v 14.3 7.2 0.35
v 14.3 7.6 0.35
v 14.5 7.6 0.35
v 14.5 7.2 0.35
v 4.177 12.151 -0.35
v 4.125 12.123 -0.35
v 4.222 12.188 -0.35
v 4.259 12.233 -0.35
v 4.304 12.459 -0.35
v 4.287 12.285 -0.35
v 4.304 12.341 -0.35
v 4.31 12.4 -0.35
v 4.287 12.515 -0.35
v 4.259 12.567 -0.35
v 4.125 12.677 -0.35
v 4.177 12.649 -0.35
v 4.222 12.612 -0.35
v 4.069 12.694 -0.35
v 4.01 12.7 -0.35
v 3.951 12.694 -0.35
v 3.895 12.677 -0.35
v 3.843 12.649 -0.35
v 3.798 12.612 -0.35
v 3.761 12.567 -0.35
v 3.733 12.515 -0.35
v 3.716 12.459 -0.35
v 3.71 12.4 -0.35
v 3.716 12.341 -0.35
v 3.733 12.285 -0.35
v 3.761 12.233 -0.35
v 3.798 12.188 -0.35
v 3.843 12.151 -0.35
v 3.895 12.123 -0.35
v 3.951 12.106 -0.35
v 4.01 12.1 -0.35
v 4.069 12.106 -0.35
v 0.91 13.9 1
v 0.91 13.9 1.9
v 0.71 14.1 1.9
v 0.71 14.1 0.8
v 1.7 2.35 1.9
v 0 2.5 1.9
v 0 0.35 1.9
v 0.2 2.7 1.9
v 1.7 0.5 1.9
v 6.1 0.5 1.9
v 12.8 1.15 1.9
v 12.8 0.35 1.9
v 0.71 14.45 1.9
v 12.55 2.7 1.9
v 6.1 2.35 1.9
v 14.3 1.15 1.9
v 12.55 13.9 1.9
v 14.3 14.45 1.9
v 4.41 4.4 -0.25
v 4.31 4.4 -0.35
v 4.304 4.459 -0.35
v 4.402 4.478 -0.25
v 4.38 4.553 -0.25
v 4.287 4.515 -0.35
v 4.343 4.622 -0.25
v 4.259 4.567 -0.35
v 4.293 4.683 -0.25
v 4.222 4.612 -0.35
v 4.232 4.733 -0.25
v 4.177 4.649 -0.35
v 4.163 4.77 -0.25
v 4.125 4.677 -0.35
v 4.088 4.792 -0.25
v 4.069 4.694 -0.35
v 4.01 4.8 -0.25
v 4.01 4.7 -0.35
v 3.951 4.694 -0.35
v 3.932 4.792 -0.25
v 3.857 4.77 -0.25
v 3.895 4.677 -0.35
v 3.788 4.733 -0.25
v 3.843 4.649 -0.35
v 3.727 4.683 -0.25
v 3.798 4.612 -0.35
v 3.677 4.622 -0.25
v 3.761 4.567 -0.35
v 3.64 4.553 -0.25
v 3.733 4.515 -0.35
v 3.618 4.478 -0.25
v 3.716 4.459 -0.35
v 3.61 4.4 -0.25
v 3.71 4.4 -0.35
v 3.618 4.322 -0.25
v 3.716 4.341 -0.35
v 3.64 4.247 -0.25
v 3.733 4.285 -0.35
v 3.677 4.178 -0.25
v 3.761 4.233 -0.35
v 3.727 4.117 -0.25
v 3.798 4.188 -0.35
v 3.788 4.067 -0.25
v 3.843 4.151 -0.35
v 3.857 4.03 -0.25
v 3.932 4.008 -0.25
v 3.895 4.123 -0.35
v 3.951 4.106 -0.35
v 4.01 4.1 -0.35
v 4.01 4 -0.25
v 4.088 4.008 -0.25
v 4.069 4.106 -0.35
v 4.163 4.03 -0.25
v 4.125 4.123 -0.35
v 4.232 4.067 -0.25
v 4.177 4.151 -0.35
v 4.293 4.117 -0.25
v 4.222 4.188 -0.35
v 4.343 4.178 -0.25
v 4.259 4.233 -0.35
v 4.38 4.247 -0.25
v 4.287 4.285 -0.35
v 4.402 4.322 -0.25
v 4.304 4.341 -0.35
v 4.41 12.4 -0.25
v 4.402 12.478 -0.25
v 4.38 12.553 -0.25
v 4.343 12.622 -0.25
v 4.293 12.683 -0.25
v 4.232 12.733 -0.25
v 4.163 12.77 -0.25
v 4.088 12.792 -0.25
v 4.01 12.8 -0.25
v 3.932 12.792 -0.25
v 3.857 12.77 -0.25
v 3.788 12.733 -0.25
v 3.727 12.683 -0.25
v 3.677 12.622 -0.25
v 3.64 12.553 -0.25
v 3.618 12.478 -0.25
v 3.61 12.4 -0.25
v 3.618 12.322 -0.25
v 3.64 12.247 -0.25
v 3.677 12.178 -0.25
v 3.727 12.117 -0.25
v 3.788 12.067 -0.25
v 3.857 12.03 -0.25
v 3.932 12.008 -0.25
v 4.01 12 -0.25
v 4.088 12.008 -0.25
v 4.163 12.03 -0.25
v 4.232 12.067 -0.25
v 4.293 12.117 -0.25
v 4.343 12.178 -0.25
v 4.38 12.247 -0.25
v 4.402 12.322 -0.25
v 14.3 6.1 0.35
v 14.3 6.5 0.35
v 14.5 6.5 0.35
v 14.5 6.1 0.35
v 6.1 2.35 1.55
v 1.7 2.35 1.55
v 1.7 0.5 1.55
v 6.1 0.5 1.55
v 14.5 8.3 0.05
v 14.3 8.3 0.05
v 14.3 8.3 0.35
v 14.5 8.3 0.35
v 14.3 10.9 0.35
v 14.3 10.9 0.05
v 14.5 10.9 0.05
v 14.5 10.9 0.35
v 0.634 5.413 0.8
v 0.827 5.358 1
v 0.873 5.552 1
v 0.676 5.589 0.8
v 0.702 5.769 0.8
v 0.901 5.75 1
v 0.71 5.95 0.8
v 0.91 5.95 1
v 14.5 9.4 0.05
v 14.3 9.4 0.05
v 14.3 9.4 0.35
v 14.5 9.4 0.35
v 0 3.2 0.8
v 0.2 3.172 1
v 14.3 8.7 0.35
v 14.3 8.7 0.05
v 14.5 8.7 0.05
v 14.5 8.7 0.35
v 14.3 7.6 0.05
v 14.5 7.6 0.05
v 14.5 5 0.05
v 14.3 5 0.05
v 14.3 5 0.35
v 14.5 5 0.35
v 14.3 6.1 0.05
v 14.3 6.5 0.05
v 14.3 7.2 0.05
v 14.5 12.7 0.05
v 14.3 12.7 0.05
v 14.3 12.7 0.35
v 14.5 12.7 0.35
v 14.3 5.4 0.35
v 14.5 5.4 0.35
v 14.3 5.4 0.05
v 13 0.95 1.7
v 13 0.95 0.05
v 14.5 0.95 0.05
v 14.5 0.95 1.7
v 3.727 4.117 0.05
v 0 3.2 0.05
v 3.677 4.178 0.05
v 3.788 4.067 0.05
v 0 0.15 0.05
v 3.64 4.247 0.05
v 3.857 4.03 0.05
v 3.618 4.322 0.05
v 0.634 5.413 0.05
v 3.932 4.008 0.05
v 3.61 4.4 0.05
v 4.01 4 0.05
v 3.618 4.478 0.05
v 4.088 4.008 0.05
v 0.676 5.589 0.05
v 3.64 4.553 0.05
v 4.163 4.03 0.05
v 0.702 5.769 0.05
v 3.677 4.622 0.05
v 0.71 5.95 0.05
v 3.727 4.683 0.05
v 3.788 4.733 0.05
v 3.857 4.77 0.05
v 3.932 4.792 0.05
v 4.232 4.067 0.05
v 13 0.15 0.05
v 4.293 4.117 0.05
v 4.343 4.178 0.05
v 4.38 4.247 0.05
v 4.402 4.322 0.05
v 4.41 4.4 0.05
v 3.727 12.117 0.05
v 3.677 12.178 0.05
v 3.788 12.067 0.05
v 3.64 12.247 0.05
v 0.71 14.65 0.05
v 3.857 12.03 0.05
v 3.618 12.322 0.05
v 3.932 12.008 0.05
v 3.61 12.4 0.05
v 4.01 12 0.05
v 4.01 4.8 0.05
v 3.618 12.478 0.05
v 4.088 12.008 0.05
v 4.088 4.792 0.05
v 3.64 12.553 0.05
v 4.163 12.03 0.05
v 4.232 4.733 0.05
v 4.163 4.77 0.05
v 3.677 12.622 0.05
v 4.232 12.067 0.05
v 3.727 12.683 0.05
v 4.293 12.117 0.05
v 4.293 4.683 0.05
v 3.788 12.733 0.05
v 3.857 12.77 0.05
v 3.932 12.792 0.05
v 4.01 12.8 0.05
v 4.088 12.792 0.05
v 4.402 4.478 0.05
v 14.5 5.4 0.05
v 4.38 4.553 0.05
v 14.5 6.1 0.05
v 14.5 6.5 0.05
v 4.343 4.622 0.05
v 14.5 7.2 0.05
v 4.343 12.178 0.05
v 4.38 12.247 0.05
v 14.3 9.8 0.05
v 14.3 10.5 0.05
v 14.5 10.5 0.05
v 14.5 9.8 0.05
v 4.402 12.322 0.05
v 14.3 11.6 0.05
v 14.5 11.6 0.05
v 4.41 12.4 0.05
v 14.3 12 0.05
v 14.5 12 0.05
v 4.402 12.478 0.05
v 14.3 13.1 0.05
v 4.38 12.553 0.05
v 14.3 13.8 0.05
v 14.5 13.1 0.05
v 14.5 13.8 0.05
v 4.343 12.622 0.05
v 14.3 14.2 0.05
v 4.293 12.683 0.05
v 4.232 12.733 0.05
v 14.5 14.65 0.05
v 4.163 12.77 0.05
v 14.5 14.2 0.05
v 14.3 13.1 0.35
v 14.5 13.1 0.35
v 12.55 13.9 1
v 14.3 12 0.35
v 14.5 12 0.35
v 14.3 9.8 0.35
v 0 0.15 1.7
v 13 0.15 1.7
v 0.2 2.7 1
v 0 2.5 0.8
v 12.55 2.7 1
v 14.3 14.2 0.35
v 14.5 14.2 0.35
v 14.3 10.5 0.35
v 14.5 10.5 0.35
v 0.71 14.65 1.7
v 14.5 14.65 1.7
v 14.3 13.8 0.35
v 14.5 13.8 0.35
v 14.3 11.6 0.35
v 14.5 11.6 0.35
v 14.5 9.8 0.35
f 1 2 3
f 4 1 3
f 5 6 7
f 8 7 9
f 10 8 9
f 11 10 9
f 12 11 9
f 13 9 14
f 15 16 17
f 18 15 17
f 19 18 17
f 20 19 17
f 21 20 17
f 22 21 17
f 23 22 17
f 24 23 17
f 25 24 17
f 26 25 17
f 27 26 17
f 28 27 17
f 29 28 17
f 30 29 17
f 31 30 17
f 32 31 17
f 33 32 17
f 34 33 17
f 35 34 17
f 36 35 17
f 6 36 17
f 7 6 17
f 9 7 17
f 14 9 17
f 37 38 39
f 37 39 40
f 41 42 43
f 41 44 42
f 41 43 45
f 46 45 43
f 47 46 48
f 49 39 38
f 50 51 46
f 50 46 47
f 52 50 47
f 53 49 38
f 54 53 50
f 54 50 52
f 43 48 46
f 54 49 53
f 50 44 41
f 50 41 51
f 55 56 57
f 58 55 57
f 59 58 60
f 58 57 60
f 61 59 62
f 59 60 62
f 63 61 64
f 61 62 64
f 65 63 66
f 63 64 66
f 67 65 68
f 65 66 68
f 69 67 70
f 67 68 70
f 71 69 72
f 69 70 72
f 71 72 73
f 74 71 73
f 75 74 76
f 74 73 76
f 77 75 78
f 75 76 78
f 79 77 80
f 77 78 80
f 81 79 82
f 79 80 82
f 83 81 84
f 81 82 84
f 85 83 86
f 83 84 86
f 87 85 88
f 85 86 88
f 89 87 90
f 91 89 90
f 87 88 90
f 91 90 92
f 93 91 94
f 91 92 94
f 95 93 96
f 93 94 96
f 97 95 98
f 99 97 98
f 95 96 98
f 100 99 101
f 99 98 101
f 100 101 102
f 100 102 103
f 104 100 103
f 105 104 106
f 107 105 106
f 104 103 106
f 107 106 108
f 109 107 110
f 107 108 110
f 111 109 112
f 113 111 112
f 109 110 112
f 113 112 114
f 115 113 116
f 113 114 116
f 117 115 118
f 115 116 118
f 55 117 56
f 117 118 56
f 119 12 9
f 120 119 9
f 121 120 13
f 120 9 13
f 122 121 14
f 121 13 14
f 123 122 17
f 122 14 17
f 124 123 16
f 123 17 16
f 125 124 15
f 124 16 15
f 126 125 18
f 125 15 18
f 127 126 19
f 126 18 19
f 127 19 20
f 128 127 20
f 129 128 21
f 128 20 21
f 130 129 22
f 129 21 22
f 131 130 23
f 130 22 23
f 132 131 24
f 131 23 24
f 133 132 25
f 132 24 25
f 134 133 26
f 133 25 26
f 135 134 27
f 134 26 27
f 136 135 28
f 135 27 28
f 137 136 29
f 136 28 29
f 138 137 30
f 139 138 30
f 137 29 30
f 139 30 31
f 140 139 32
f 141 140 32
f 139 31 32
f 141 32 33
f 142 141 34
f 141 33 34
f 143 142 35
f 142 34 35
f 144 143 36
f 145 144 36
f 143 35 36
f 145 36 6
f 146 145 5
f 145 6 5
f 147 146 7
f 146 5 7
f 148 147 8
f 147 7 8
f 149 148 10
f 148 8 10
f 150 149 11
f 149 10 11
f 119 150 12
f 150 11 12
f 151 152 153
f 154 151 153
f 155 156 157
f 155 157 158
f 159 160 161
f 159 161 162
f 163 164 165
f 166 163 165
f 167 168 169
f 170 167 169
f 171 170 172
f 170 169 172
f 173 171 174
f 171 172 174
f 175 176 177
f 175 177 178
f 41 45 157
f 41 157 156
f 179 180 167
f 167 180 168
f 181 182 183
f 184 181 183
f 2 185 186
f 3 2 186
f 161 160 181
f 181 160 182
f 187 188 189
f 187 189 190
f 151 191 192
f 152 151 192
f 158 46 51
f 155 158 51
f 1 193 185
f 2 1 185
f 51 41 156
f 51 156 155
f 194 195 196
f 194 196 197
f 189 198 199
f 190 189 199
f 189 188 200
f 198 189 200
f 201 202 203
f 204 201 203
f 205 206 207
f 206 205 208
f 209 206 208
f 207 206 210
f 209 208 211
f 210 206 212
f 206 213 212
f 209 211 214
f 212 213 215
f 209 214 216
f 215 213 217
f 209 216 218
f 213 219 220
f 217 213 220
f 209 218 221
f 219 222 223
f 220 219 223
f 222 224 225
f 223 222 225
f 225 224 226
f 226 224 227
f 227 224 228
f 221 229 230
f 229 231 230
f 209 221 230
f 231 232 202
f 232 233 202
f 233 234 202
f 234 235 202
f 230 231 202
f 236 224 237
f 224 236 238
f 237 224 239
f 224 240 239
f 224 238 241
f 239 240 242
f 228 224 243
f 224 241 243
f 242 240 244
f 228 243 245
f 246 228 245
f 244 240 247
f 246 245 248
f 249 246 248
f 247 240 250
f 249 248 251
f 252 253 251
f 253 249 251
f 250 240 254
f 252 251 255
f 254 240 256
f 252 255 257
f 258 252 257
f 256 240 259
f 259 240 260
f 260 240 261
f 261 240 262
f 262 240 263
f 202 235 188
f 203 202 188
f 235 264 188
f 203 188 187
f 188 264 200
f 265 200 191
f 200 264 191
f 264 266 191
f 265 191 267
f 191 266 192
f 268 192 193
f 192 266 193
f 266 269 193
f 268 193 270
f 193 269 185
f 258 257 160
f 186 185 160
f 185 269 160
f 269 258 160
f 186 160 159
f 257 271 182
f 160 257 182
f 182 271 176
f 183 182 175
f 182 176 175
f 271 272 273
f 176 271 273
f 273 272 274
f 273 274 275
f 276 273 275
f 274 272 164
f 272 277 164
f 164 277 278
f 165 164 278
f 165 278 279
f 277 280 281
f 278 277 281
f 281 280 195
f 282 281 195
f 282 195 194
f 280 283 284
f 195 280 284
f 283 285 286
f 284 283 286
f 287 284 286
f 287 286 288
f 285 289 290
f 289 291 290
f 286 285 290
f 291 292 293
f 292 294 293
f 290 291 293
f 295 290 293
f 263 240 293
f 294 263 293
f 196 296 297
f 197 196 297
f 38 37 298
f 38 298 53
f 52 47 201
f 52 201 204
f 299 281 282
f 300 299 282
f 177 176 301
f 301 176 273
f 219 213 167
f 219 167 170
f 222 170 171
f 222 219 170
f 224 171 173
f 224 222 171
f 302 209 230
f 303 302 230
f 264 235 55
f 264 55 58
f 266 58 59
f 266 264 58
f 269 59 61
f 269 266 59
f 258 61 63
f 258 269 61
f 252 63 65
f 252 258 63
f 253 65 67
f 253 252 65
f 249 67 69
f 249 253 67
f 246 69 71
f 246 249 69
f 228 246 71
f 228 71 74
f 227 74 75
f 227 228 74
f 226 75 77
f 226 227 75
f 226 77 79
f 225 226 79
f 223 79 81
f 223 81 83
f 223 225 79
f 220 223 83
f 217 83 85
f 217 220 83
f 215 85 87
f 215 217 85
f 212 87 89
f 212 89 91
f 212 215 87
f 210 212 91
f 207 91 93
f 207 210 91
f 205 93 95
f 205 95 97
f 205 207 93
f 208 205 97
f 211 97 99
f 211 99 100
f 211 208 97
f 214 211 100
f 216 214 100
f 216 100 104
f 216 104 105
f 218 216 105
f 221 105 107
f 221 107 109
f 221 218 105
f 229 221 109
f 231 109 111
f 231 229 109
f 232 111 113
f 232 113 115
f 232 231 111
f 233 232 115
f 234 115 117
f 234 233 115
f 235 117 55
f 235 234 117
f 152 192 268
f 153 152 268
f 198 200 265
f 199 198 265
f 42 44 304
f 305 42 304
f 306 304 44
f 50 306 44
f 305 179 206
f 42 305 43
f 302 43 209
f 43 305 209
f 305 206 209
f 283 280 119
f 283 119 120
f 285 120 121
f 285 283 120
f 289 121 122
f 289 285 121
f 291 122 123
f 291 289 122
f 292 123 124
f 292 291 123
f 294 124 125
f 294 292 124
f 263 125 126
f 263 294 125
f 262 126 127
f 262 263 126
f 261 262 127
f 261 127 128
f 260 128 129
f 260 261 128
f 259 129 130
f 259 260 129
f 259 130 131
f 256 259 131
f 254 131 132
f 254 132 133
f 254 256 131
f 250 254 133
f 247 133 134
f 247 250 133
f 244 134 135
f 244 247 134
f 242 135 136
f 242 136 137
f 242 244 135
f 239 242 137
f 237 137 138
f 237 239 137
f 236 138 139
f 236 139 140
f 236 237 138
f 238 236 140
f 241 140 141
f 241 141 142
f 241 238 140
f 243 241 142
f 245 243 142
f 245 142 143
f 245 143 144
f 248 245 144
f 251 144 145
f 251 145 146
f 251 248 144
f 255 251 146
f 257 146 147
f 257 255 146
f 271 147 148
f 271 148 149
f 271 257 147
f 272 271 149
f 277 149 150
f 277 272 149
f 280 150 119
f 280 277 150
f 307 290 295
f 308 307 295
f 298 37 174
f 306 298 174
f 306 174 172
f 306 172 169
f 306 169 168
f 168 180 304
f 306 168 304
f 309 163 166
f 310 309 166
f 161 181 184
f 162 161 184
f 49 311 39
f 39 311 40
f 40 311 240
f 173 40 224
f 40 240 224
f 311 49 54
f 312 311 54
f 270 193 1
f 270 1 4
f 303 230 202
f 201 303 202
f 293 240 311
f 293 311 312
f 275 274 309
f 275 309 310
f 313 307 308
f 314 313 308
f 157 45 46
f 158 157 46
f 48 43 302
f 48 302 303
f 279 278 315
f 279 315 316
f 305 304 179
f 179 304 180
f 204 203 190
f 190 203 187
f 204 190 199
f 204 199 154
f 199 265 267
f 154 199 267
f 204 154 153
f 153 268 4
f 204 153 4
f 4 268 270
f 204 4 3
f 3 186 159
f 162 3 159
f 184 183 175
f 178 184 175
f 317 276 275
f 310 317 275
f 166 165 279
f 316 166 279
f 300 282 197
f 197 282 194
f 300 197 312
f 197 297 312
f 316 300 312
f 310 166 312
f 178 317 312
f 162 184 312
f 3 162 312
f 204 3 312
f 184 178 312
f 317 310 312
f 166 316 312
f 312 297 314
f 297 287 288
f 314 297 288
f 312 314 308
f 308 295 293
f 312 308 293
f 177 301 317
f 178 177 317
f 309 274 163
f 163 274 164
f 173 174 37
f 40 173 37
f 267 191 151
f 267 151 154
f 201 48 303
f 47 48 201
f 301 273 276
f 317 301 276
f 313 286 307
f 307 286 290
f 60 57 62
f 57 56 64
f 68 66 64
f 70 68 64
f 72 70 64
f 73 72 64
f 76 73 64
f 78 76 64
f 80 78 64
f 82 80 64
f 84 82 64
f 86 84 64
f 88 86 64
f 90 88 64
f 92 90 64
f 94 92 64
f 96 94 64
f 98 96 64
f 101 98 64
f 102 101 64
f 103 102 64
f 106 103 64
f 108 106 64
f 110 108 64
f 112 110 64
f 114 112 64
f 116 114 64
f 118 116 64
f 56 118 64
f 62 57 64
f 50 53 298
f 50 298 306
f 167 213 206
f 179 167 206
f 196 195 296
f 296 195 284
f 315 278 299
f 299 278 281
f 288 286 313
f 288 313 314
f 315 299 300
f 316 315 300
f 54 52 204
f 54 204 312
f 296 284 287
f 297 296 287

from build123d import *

# Parameters (mm, degrees)
PAD_DEPTH       = 1.85
SKETCH_W        = 4.4
SKETCH_H        = 1.85
POCKET001_DEPTH = 0.4
SKETCH005_W     = 11.2
SKETCH005_H     = 0.9
POCKET002_DEPTH = 12.6
SKETCH006_R     = 0.4
PAD003_DEPTH    = 0.4
SKETCH008_W     = 0.2
SKETCH008_H     = 0.4
POCKET003_DEPTH = 0.3
CHAMFER_SIZE    = 0.1
CHAMFER001_SIZE = 0.2


with BuildPart() as part:
    # Sketch004 → Pad (new body)
    with BuildSketch(Plane.XY.offset(0.05)):
        with BuildLine():
            Line((0.71, 14.65), (0.71, 5.95))
            ThreePointArc((0.634493, 5.41274), (0.691031, 5.67873), (0.71, 5.95))
            Line((0.634493, 5.41274), (0, 3.2))
            Line((0, 3.2), (0, 0.15))
            Line((0, 0.15), (13, 0.15))
            Line((13, 0.15), (13, 0.95))
            Line((13, 0.95), (14.5, 0.95))
            Line((14.5, 0.95), (14.5, 14.65))
            Line((0.71, 14.65), (14.5, 14.65))
        make_face()
    extrude(amount=PAD_DEPTH)

    # Sketch (on Face11 of Pad) → Pocket001 (cut)
    with BuildSketch(Plane.XY.offset(1.95)):
        with Locations((3.9, 1.425)):
            Rectangle(SKETCH_W, SKETCH_H)
    extrude(amount=-POCKET001_DEPTH, mode=Mode.SUBTRACT)

    # Sketch005 (on Face8 of Pocket001) → Pocket002 (cut)
    with BuildSketch(Plane(origin=(-0.05, 0, 0), x_dir=(0, -1, 0), z_dir=(-1, 0, 0))):
        with Locations((-8.3, 1.45)):
            Rectangle(SKETCH005_W, SKETCH005_H)
    extrude(amount=-POCKET002_DEPTH, mode=Mode.SUBTRACT)

    # Sketch006 → Pad003 (join)
    with BuildSketch(Plane.XY.offset(0.05)):
        with Locations((4.01, 4.4)):
            Circle(SKETCH006_R)
        with Locations((4.01, 12.4)):
            Circle(SKETCH006_R)
    extrude(amount=-PAD003_DEPTH)

    # Sketch008 → Pocket003 (cut)
    with BuildSketch(Plane.XY.offset(0.05)):
        with Locations((14.4, 5.2)):
            Rectangle(SKETCH008_W, SKETCH008_H)
        with Locations((14.4, 6.3)):
            Rectangle(SKETCH008_W, SKETCH008_H)
        with Locations((14.4, 7.4)):
            Rectangle(SKETCH008_W, SKETCH008_H)
        with Locations((14.4, 8.5)):
            Rectangle(SKETCH008_W, SKETCH008_H)
        with Locations((14.4, 9.6)):
            Rectangle(SKETCH008_W, SKETCH008_H)
        with Locations((14.4, 10.7)):
            Rectangle(SKETCH008_W, SKETCH008_H)
        with Locations((14.4, 11.8)):
            Rectangle(SKETCH008_W, SKETCH008_H)
        with Locations((14.4, 12.9)):
            Rectangle(SKETCH008_W, SKETCH008_H)
        with Locations((14.4, 14)):
            Rectangle(SKETCH008_W, SKETCH008_H)
    extrude(amount=POCKET003_DEPTH, mode=Mode.SUBTRACT)

    # Chamfer
    chamfer_edges = [part.edges().sort_by_distance(p)[0] for p in [
        (3.61, 12.4, -0.35),
        (3.61, 4.4, -0.35),
    ]]
    chamfer(chamfer_edges, length=CHAMFER_SIZE)

    # Chamfer001
    chamfer001_edges = [part.edges().sort_by_distance(p)[0] for p in [
        (7.605, 14.65, 1.9),
        (14.5, 7.8, 1.9),
        (13.75, 0.95, 1.9),
        (13, 0.55, 1.9),
        (6.5, 0.15, 1.9),
        (0.71, 13.9, 1.45),
        (0.71, 9.925, 1),
        (0.691031, 5.67873, 1),
        (0.317247, 4.30637, 1),
        (0, 2.95, 1),
        (0, 2.7, 1.45),
    ]]
    chamfer(chamfer001_edges, length=CHAMFER001_SIZE)


solid = part.part
